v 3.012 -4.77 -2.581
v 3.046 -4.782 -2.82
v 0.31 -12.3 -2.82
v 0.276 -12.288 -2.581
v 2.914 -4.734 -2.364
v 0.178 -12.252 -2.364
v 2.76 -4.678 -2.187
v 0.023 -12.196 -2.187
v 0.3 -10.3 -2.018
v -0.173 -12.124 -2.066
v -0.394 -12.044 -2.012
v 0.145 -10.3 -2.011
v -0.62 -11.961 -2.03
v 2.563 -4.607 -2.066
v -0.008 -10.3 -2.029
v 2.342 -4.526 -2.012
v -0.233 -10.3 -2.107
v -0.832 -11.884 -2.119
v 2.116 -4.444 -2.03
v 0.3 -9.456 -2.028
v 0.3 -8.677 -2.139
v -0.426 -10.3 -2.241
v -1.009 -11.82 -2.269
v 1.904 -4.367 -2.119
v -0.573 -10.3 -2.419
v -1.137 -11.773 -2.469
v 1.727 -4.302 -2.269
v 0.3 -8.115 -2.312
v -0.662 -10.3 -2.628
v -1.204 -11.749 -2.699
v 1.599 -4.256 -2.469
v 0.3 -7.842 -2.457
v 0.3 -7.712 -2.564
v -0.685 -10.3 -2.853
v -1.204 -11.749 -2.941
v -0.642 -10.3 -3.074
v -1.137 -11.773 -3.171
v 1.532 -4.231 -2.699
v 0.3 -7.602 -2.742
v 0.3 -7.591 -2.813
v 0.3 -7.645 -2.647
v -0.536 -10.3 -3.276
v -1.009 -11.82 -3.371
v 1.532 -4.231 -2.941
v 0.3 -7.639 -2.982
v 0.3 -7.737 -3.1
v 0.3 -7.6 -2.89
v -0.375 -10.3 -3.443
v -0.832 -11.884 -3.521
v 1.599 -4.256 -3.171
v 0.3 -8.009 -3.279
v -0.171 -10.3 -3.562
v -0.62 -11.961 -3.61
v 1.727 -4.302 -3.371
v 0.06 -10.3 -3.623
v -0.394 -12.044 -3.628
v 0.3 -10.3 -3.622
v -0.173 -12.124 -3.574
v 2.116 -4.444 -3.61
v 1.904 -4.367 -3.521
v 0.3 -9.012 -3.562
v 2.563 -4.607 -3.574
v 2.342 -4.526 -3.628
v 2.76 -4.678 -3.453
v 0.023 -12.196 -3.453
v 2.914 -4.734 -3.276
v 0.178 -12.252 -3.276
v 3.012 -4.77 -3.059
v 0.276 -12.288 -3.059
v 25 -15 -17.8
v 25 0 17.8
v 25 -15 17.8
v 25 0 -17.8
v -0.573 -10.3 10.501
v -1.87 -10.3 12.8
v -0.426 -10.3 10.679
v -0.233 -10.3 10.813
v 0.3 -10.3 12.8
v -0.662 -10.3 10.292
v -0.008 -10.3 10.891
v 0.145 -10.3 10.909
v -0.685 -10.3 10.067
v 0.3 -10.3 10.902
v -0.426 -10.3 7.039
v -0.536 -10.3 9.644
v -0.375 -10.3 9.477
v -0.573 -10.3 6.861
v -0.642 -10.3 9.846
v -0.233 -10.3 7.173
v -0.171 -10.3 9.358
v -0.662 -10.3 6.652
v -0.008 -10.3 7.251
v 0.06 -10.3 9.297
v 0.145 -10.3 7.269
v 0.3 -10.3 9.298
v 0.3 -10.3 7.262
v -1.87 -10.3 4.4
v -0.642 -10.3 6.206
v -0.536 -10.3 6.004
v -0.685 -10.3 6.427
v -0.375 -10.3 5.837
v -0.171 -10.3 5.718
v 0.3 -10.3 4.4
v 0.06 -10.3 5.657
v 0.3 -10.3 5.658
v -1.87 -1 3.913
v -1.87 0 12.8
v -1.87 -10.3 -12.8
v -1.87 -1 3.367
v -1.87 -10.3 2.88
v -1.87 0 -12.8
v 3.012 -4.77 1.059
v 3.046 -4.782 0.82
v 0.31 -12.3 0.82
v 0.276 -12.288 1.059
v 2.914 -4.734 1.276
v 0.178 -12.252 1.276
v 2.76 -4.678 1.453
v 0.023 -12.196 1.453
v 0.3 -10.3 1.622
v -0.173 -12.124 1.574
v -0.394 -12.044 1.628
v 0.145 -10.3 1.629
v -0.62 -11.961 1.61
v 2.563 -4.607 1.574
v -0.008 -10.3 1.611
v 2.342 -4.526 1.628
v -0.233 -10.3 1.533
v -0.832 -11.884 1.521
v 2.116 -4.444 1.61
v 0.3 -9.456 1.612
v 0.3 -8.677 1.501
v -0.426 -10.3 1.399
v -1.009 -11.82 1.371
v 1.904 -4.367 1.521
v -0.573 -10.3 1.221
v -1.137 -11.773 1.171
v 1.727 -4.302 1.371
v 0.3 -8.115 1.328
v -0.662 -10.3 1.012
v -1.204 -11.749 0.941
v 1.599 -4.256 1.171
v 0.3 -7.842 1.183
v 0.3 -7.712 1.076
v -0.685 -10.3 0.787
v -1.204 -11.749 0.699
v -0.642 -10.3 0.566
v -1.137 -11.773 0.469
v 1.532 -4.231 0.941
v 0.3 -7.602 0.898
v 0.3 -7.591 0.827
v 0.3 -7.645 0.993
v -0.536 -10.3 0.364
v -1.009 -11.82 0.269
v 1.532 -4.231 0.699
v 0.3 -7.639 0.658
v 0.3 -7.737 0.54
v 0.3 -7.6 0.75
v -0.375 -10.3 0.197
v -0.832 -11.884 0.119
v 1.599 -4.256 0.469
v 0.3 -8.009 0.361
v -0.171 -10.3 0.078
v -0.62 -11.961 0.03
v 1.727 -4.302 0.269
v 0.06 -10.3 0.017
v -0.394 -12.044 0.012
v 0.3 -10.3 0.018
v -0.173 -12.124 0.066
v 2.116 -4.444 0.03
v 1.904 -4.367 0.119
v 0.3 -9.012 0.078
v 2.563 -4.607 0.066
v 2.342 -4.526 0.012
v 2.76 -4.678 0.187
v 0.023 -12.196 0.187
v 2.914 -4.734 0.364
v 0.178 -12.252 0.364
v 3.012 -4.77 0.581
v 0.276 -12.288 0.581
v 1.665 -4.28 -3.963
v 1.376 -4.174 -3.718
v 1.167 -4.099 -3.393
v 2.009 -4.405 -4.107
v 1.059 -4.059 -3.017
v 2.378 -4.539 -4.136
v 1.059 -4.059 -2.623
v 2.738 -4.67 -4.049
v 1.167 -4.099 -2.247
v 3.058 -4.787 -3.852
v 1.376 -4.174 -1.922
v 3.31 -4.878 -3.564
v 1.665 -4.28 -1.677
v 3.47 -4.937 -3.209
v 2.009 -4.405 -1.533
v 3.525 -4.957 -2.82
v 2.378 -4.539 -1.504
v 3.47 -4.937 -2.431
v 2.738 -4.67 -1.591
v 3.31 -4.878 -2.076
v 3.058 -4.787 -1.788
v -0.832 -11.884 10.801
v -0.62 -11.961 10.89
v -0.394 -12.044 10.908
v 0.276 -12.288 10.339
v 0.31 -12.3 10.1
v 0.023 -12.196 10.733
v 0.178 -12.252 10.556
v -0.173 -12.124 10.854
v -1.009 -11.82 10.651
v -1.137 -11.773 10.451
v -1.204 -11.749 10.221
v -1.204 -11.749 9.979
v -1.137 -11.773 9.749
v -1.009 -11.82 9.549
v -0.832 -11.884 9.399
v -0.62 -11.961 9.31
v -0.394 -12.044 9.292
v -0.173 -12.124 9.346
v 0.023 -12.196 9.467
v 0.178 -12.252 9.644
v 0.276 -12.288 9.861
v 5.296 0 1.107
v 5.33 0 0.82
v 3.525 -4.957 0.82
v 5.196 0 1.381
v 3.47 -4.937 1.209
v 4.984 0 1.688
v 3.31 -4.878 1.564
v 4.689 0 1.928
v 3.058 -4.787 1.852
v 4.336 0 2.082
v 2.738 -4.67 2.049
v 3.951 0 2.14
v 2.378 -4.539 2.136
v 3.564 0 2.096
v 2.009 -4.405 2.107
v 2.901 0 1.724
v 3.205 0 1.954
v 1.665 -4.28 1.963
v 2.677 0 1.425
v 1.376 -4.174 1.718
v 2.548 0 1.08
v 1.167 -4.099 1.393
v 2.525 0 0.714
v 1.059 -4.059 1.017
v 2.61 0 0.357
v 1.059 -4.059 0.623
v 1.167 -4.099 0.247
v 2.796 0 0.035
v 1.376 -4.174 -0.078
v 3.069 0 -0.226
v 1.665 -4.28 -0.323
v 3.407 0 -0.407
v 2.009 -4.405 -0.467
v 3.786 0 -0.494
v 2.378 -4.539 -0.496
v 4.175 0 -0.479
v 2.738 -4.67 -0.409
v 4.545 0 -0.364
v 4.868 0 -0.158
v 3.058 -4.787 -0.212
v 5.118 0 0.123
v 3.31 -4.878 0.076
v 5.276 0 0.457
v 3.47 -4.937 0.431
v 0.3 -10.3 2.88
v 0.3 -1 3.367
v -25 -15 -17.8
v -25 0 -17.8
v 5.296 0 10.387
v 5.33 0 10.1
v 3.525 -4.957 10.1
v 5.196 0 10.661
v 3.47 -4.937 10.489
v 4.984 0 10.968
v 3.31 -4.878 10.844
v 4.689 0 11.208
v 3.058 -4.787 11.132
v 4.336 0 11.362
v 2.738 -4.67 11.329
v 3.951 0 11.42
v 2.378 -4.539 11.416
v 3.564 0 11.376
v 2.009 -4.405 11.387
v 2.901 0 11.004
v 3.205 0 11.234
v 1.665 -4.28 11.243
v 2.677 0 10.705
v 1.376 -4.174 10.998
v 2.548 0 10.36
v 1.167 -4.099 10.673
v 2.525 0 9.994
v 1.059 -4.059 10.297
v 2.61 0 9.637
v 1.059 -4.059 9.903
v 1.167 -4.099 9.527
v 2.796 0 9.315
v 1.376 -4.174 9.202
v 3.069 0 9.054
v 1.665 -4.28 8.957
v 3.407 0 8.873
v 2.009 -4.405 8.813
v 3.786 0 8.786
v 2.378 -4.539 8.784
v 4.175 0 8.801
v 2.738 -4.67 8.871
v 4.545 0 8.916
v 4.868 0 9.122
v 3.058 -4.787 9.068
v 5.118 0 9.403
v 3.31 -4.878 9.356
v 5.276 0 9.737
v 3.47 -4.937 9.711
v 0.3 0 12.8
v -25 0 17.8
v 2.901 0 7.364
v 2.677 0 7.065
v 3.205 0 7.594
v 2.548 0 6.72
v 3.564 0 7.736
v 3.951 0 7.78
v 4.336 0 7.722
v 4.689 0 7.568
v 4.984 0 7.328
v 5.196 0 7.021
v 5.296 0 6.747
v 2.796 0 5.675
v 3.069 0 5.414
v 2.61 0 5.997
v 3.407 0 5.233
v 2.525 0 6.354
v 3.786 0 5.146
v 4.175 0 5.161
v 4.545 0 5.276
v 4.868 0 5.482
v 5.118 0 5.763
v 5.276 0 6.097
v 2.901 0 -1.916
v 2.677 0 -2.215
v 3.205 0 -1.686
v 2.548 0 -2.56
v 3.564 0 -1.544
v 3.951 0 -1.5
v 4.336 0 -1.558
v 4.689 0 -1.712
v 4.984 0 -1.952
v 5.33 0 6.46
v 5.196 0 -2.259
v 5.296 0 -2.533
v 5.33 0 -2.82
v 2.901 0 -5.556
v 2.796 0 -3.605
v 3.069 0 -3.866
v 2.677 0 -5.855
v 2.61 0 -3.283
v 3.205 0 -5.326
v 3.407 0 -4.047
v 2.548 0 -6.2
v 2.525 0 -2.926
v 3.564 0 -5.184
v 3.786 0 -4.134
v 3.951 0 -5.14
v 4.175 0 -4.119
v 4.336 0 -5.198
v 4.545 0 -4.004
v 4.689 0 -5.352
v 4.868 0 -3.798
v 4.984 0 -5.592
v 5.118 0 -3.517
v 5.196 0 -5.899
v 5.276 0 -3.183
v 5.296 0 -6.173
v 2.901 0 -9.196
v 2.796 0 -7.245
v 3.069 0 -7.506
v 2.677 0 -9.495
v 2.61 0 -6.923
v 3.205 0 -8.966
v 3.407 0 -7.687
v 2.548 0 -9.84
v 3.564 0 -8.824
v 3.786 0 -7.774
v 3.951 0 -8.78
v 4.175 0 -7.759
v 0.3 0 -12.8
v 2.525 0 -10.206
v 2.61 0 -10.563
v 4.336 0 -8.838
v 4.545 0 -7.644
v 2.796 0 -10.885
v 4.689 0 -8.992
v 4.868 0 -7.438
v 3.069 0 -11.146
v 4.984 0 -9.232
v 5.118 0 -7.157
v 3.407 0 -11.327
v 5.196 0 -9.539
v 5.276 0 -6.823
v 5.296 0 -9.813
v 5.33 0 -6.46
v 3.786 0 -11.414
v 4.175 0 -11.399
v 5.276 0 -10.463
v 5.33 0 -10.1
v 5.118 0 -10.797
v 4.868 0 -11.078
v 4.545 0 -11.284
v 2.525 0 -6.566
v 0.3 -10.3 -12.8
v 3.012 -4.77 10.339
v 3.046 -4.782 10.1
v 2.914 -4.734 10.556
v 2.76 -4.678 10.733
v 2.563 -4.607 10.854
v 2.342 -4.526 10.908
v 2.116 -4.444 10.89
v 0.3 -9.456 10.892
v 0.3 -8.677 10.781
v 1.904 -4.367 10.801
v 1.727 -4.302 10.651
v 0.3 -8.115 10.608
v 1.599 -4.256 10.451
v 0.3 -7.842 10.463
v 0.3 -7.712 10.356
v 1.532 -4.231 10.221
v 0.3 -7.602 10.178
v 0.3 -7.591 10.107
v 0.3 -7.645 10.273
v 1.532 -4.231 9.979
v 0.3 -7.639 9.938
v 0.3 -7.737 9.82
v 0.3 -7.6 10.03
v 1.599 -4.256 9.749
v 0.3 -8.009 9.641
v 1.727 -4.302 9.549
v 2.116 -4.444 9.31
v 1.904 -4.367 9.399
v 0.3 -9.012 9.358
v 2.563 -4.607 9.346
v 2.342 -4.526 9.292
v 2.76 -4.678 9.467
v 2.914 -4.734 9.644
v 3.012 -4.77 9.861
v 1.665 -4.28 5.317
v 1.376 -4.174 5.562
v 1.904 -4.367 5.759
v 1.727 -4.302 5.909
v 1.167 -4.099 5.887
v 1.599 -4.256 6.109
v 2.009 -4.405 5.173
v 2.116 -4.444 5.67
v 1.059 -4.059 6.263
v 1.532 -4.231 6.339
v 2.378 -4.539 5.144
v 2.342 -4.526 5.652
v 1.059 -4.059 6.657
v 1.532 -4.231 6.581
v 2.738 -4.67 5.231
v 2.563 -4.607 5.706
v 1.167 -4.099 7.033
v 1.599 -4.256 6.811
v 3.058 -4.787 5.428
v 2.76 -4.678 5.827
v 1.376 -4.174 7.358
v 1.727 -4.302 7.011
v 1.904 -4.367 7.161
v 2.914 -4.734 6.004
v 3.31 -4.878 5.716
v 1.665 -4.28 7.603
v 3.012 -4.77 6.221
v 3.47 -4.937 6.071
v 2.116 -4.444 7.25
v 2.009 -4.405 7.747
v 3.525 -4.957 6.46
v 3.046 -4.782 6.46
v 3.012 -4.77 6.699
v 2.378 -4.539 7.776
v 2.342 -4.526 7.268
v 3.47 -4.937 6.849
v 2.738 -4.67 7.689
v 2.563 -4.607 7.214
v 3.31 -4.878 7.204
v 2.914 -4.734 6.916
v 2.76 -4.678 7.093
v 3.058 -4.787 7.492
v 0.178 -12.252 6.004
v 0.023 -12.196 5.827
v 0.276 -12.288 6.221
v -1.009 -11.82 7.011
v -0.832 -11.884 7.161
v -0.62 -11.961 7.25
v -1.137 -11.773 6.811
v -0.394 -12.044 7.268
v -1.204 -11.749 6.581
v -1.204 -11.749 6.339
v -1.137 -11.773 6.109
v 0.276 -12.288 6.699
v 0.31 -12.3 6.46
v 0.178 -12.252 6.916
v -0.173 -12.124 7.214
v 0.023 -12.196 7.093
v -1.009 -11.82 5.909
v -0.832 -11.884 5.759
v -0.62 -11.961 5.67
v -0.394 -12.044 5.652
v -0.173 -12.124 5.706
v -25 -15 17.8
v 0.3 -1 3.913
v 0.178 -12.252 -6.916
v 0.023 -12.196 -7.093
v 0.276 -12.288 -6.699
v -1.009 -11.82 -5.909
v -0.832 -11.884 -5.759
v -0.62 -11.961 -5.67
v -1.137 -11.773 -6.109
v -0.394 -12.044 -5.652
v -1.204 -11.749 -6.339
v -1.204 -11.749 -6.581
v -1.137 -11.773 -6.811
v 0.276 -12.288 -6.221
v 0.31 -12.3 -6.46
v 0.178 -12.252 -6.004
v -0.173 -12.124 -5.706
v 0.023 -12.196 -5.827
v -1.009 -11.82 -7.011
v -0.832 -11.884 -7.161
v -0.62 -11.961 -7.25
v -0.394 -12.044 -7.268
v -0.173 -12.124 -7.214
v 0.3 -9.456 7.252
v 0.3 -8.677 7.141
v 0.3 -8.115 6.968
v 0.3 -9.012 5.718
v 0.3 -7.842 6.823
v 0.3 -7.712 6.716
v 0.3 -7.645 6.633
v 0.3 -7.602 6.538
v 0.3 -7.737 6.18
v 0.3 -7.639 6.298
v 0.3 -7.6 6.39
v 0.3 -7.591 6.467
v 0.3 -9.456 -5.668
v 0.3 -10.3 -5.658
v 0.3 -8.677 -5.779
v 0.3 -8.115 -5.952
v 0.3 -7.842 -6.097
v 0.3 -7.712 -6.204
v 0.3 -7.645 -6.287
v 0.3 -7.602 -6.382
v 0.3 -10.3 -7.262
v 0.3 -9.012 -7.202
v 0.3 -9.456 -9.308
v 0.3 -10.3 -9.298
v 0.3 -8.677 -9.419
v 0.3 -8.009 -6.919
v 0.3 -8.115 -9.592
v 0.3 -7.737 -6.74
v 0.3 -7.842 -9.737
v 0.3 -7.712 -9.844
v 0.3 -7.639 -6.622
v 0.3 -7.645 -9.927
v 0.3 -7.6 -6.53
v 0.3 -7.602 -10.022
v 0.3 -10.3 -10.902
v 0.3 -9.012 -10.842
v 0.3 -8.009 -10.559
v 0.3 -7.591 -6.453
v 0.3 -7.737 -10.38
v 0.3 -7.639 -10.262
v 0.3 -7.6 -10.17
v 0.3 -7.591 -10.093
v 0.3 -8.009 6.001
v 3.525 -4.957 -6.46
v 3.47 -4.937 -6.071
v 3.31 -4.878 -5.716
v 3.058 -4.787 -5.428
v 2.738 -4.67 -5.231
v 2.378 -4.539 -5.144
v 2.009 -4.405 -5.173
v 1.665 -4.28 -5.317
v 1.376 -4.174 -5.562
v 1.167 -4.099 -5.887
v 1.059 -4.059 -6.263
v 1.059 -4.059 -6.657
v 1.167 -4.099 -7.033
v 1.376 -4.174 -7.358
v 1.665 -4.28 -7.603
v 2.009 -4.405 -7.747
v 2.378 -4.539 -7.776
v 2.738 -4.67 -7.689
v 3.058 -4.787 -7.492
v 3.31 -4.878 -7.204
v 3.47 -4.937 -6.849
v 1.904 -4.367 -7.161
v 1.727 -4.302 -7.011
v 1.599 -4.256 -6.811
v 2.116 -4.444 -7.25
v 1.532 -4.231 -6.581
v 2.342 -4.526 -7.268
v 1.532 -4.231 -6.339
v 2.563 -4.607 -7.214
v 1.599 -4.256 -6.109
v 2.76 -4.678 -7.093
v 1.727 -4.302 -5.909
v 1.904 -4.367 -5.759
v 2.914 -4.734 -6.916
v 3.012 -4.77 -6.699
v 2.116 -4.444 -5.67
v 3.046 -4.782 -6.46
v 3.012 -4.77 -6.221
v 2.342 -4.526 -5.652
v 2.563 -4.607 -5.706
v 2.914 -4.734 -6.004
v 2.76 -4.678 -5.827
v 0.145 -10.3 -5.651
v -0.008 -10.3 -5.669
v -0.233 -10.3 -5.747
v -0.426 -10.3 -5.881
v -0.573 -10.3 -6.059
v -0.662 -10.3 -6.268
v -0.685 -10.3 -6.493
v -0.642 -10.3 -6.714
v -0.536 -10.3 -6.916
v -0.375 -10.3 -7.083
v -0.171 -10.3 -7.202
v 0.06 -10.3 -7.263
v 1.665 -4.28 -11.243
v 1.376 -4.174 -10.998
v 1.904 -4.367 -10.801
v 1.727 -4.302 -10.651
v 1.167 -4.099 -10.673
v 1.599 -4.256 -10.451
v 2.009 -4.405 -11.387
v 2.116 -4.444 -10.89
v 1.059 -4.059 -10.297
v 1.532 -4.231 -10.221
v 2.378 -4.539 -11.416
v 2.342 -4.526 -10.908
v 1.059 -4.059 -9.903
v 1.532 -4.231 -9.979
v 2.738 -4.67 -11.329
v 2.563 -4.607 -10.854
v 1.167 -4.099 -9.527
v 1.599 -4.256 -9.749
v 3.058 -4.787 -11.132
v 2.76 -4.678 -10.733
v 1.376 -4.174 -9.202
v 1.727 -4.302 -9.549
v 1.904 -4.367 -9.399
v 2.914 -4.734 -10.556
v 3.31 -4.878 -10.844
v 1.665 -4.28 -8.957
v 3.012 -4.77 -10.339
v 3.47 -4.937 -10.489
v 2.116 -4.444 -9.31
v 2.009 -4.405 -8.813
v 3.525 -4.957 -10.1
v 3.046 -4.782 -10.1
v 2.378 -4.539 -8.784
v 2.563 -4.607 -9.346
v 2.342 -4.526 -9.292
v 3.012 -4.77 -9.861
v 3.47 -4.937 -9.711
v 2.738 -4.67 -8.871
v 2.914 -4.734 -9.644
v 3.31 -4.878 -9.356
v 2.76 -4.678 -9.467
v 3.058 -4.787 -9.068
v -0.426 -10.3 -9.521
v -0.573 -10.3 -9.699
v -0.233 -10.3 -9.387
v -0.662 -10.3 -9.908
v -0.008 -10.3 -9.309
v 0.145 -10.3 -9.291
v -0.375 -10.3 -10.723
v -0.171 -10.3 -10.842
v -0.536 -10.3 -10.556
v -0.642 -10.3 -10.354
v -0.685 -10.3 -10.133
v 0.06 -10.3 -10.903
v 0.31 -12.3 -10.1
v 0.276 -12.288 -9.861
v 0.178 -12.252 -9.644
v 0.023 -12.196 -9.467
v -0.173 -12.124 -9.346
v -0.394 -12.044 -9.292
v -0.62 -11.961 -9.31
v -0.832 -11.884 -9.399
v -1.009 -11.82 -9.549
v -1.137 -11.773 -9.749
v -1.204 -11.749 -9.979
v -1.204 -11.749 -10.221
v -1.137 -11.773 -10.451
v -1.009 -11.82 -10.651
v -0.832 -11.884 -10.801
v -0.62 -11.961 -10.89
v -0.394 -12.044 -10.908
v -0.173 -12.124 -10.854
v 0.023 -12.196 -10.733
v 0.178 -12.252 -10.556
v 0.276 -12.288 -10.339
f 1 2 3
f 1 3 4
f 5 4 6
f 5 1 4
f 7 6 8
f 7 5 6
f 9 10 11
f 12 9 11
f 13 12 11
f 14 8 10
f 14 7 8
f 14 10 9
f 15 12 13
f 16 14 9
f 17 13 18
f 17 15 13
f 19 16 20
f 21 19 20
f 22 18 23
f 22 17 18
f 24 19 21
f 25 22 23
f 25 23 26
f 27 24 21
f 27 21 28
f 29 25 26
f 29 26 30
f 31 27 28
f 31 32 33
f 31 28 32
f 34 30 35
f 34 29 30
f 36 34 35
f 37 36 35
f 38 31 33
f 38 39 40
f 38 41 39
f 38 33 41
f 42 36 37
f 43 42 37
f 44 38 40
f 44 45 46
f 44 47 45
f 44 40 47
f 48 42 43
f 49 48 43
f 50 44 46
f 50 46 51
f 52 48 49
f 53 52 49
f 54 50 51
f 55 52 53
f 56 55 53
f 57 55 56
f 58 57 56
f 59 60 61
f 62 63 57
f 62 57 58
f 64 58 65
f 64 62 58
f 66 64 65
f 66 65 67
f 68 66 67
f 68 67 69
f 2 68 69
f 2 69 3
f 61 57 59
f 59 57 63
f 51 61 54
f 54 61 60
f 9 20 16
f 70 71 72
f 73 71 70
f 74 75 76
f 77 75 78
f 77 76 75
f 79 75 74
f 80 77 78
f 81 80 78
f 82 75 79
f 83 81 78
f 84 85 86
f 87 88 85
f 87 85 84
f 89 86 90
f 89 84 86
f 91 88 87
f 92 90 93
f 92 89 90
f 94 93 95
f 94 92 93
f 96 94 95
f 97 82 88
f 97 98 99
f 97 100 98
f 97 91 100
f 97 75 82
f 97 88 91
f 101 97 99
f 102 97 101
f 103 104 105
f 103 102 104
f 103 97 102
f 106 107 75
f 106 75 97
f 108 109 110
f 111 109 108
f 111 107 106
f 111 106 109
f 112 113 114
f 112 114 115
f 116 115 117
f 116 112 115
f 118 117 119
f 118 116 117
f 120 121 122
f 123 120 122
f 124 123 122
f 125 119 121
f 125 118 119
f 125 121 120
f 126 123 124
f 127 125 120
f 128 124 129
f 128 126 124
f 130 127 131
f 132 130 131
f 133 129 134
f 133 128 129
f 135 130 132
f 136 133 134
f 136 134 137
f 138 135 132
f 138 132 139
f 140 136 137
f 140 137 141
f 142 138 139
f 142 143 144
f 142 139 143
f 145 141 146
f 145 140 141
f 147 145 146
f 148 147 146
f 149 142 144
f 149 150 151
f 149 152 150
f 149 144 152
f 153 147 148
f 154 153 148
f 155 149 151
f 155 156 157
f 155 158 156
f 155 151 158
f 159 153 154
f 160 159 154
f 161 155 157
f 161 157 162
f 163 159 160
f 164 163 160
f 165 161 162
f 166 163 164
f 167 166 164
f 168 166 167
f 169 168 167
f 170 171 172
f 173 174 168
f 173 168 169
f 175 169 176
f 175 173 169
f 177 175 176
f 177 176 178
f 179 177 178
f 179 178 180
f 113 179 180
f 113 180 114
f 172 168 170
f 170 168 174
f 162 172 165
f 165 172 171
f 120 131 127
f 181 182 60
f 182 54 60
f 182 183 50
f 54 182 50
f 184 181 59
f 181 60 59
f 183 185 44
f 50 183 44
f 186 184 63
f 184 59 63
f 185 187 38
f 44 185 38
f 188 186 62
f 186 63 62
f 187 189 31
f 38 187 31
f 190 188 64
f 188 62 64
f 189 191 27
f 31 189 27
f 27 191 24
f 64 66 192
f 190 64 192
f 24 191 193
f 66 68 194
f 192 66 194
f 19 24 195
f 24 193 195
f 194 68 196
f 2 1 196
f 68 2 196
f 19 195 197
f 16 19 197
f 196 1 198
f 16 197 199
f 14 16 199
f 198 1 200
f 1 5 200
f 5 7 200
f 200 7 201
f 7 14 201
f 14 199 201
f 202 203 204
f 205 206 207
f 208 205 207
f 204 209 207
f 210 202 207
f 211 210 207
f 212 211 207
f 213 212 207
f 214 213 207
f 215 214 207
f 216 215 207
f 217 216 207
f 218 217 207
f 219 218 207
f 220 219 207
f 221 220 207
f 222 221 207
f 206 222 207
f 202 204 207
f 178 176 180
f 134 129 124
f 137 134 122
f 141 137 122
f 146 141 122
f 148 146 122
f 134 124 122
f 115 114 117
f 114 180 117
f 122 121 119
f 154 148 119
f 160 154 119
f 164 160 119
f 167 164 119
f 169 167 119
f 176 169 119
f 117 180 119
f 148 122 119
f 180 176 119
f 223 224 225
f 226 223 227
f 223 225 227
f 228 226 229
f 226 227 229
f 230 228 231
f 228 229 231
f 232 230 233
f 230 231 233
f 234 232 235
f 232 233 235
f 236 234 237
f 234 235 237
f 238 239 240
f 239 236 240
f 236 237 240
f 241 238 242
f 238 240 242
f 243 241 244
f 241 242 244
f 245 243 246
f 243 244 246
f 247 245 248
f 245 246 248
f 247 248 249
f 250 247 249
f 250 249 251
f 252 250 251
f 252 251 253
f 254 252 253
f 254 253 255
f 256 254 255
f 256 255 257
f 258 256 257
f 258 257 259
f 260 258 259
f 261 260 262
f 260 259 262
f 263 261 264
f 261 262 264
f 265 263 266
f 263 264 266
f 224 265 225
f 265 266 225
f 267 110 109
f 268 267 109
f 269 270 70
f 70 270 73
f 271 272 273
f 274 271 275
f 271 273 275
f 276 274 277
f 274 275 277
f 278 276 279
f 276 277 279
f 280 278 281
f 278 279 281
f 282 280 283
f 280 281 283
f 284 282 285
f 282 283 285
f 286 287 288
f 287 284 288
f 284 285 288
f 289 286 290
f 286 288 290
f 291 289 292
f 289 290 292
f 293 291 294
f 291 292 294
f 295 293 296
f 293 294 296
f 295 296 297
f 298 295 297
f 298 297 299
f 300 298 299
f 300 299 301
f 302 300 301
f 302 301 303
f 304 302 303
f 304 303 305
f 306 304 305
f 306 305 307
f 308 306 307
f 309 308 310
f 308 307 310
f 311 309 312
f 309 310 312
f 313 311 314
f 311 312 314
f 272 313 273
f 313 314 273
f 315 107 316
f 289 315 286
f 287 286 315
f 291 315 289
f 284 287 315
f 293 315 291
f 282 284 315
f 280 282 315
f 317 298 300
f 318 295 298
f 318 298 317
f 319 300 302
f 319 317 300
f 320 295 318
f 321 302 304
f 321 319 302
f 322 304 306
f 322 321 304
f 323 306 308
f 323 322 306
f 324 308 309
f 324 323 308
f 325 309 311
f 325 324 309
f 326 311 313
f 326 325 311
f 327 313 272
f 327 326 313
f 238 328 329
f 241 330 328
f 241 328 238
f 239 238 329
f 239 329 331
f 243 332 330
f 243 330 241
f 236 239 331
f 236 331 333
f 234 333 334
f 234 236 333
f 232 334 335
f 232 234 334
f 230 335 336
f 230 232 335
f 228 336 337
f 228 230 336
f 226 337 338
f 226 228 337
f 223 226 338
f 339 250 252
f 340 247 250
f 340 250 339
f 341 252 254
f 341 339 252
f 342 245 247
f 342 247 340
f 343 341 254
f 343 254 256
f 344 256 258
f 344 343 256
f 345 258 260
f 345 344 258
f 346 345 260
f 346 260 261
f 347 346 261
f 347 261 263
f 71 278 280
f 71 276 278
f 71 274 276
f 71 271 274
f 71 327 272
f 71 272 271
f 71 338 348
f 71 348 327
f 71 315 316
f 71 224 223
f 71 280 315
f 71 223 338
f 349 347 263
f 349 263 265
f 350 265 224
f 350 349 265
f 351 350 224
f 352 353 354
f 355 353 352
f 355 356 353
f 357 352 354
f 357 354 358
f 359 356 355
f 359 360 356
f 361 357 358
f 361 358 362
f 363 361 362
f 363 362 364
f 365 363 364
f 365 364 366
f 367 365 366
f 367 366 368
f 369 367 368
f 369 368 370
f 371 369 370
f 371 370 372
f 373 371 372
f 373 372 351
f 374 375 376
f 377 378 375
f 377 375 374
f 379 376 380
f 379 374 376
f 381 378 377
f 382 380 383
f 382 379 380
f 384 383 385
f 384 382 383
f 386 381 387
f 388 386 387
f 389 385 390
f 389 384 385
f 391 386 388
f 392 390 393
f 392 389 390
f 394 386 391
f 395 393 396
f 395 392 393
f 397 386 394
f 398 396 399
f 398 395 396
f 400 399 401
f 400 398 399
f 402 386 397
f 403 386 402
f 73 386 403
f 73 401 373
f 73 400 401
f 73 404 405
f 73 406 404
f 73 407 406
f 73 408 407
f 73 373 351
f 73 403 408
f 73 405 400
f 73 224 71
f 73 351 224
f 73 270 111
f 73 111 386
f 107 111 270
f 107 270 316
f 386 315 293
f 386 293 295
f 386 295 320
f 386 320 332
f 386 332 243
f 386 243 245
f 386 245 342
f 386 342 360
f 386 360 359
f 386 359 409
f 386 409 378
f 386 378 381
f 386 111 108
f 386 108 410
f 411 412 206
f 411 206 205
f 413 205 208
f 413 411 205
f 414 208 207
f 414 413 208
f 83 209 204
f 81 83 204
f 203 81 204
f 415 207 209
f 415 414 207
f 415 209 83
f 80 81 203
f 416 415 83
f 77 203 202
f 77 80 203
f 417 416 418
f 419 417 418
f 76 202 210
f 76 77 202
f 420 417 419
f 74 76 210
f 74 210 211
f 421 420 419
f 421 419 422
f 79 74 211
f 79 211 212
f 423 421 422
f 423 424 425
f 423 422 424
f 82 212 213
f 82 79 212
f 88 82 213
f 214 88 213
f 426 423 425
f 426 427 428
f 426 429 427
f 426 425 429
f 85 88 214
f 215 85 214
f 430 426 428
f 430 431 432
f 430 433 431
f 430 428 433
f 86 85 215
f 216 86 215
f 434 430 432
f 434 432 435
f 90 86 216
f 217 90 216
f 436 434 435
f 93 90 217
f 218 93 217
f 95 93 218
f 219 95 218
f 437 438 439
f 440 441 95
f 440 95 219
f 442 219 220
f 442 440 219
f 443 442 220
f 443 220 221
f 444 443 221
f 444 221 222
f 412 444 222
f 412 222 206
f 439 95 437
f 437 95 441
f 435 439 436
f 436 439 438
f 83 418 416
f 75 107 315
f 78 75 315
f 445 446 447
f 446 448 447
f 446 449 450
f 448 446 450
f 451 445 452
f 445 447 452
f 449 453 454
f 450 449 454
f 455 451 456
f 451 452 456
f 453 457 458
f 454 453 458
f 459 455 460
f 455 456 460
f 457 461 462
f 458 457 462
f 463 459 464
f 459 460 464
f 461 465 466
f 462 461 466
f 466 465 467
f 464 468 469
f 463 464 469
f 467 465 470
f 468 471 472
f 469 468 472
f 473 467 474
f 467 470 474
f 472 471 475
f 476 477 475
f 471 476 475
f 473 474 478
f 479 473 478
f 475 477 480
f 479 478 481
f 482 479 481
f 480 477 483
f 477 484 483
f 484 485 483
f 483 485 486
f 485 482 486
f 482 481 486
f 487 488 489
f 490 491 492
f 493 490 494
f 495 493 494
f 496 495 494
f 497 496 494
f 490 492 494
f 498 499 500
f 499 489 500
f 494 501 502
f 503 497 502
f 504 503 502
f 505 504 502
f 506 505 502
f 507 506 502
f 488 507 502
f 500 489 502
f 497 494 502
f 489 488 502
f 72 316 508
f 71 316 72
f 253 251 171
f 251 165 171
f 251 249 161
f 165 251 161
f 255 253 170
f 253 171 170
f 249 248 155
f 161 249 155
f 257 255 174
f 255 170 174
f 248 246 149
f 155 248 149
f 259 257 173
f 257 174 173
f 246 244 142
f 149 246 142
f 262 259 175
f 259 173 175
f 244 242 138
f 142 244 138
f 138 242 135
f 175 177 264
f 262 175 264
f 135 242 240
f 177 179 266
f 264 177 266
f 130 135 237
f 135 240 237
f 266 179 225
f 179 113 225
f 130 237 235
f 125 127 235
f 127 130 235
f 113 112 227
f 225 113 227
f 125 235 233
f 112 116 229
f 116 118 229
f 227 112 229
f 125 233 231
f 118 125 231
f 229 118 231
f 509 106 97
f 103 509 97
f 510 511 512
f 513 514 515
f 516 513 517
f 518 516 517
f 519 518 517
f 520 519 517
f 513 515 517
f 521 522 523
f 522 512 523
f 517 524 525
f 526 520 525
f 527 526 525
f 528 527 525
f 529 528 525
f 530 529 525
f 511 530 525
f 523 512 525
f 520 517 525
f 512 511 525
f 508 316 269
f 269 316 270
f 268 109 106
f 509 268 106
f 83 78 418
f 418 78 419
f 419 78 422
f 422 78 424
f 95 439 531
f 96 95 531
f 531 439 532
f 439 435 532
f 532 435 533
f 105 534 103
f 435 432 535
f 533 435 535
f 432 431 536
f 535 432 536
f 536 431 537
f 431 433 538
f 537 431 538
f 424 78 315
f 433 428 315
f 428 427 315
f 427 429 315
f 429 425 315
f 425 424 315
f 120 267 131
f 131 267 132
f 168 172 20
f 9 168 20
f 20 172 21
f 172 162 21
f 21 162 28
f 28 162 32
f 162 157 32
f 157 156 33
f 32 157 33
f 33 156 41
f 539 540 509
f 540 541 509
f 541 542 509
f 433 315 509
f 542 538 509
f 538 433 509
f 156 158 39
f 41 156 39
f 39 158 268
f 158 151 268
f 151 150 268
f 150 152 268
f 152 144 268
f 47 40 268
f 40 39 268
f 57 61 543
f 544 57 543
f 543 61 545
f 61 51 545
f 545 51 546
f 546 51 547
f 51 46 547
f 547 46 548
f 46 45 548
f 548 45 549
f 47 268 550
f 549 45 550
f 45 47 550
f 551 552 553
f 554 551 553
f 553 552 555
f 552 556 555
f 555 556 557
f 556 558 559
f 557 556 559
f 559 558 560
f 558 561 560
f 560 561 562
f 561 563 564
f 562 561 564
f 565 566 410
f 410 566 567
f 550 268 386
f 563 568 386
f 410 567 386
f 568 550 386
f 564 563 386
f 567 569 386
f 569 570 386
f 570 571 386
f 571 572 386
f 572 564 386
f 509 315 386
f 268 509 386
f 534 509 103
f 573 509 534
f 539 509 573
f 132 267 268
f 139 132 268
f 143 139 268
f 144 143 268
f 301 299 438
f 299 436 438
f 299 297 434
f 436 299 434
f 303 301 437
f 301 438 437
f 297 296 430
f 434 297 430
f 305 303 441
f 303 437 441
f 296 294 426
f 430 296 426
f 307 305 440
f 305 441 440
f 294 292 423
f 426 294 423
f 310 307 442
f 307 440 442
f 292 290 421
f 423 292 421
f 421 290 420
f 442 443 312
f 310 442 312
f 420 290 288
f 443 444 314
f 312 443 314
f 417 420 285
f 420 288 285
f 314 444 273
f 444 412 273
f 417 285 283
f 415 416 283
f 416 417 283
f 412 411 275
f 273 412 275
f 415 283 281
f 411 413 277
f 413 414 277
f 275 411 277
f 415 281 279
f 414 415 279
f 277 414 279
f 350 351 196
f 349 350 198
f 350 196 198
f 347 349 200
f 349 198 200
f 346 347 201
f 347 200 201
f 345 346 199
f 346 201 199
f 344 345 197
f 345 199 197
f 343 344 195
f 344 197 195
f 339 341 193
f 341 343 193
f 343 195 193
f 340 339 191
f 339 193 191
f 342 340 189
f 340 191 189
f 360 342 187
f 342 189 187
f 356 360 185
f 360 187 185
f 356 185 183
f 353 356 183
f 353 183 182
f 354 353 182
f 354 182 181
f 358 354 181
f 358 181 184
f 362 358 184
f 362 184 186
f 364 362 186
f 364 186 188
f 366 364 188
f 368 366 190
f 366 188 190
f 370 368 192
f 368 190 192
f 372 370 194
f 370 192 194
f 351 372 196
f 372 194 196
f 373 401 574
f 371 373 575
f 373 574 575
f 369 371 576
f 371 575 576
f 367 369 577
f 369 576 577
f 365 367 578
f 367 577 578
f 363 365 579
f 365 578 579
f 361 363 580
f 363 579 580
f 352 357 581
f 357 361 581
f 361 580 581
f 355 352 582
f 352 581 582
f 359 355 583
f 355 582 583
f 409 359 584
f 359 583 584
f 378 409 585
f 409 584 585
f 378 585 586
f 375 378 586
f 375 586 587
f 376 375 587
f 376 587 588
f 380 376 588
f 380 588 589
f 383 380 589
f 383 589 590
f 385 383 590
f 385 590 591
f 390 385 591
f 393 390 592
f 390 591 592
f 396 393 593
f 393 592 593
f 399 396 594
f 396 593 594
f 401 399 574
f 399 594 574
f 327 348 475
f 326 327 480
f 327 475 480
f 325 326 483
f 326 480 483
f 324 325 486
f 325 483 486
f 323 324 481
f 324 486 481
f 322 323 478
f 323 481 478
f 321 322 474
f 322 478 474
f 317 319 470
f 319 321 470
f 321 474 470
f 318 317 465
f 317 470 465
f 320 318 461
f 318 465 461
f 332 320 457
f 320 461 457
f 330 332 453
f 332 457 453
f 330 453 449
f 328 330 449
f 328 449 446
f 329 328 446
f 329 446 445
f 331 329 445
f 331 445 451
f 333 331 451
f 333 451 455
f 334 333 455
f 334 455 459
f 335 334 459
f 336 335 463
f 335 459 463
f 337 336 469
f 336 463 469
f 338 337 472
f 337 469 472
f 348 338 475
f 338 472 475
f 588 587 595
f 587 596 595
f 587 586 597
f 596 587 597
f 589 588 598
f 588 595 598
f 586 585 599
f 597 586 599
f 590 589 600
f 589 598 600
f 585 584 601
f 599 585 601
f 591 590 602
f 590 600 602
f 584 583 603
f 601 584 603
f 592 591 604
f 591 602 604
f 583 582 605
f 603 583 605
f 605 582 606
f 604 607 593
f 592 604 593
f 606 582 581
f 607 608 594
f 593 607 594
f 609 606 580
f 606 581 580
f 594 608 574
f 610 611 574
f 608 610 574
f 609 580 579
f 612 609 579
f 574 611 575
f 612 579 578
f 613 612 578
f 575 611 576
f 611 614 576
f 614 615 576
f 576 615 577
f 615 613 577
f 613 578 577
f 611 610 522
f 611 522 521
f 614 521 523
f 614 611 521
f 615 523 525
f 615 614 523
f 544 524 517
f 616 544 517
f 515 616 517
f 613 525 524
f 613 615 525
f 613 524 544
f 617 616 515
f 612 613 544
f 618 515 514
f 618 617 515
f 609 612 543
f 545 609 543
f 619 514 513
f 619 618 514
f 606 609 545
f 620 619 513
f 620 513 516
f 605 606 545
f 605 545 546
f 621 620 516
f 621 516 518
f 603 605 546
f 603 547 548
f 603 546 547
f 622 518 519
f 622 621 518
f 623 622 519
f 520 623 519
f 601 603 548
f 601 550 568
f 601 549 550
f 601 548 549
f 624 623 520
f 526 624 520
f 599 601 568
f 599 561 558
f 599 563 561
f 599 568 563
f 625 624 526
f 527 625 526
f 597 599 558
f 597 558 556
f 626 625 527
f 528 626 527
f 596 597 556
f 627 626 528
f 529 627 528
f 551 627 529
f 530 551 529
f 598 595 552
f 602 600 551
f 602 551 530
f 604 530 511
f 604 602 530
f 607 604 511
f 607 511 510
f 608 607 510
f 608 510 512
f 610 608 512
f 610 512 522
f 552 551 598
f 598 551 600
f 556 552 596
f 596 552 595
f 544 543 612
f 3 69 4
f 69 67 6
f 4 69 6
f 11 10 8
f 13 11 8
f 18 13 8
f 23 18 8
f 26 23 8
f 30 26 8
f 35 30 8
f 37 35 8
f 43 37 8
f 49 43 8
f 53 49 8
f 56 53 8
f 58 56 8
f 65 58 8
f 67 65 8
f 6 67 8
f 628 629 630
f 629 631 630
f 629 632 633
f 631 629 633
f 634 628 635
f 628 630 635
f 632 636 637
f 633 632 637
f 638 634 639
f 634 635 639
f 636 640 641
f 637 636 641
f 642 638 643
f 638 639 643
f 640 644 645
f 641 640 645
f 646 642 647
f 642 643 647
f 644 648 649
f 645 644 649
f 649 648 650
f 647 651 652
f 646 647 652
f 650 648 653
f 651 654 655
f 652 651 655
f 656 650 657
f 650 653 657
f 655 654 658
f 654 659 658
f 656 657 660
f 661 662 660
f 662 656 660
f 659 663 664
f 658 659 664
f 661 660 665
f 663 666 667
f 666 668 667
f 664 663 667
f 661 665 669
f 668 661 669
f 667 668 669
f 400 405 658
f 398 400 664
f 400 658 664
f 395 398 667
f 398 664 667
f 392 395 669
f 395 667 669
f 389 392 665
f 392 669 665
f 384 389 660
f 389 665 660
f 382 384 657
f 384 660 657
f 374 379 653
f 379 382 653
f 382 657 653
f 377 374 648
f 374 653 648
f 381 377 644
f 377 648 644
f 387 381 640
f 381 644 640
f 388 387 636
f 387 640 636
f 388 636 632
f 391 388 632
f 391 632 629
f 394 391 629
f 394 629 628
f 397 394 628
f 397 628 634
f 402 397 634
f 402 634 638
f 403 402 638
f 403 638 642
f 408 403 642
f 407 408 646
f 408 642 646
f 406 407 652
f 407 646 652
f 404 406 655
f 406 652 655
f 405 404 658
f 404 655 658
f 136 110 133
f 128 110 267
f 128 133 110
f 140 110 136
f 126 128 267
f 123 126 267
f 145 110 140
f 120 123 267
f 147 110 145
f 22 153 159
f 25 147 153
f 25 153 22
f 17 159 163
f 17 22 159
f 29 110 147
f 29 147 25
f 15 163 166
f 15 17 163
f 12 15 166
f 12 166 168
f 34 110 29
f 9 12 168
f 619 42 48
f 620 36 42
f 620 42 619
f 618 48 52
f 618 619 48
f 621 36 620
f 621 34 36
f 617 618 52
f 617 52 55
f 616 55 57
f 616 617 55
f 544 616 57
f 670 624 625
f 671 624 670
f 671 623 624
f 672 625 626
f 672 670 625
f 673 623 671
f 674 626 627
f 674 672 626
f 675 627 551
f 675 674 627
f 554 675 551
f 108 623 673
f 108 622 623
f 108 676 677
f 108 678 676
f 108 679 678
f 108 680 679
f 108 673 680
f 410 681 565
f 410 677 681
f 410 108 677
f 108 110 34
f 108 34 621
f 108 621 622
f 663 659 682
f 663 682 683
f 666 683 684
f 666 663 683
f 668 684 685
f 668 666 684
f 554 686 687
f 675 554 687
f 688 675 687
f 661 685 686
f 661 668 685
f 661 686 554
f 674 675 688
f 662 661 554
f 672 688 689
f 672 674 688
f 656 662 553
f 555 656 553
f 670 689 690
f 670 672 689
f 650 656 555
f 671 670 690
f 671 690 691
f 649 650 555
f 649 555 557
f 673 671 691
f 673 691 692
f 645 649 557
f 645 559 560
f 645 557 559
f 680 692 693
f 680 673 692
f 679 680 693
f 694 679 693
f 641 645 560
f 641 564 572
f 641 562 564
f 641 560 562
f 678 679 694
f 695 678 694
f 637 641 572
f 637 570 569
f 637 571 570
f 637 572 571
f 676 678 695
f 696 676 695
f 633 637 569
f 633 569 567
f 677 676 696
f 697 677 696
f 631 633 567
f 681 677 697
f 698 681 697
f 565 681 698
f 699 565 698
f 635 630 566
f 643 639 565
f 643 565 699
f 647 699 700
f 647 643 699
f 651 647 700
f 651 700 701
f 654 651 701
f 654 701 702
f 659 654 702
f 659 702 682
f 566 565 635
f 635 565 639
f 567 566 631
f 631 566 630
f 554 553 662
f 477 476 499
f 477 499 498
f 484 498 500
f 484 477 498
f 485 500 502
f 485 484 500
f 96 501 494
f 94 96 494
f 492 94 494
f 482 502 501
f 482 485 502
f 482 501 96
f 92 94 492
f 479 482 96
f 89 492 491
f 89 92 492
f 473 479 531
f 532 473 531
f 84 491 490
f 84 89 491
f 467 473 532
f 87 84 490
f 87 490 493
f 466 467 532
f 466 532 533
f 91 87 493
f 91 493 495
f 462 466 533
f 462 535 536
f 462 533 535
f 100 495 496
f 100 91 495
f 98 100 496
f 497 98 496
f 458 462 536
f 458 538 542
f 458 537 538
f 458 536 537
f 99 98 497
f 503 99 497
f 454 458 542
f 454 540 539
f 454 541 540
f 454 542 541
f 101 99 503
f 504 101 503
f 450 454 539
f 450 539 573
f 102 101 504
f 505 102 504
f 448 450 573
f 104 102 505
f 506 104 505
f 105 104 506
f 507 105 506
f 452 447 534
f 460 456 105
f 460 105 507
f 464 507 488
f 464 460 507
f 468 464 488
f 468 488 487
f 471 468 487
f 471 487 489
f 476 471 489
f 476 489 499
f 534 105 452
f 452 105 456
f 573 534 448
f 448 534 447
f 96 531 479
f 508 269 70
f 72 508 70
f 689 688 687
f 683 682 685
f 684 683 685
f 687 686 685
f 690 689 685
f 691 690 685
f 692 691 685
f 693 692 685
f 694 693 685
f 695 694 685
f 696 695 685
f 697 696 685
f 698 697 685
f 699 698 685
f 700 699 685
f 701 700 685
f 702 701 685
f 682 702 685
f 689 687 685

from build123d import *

# Parameters (mm, degrees)
SKETCH1_W                = 50
SKETCH1_H                = 35.6
BOSS_EXTRUDE2_DEPTH      = 15
SKETCH9_W                = 2.17
SKETCH9_H                = 25.6
CUT_EXTRUDE1_DEPTH       = 10.3
SKETCH7_R                = 1.32
CUT_EXTRUDE2_DEPTH       = 34.770899441
SKETCH10_R               = 0.81
CUT_EXTRUDE3_DEPTH       = 8
BOSS_EXTRUDE3_DEPTH      = 0.3
BOSS_EXTRUDE3_DEPTH_BACK = 1.87


with BuildPart() as part:
    # Sketch1 → Boss-Extrude2 (new body)
    with BuildSketch(Plane(origin=(0, 0, 0), x_dir=(1, 0, 0), z_dir=(0, 1, 0))):
        Rectangle(SKETCH1_W, SKETCH1_H)
    extrude(amount=-BOSS_EXTRUDE2_DEPTH)

    # Sketch9 → Cut-Extrude1 (cut)
    with BuildSketch(Plane(origin=(0, 0, 0), x_dir=(1, 0, 0), z_dir=(0, 1, 0))):
        with Locations((-0.785, 0)):
            Rectangle(SKETCH9_W, SKETCH9_H)
    extrude(amount=-CUT_EXTRUDE1_DEPTH, mode=Mode.SUBTRACT)

    # Sketch7 → Cut-Extrude2 (cut, through all)
    with BuildSketch(Plane(origin=(-1.180715955, -3.243990424, 0), x_dir=(-0.9396926207859082, 0.3420201433256691, 0), z_dir=(-0.3420201433256691, -0.9396926207859082, 0))):
        with Locations(Location((-3.68818129, 10.1, 0), (0, 0, 180))):
            Circle(SKETCH7_R)
        with Locations(Location((-3.68818129, 6.46, 0), (0, 0, 180))):
            Circle(SKETCH7_R)
        with Locations(Location((-3.68818129, 2.82, 0), (0, 0, 180))):
            Circle(SKETCH7_R)
        with Locations(Location((-3.68818129, -0.82, 0), (0, 0, 180))):
            Circle(SKETCH7_R)
        with Locations(Location((-3.68818129, -6.46, 0), (0, 0, 180))):
            Circle(SKETCH7_R)
        with Locations(Location((-3.68818129, -10.1, 0), (0, 0, 180))):
            Circle(SKETCH7_R)
    extrude(amount=-CUT_EXTRUDE2_DEPTH, mode=Mode.SUBTRACT)

    # Sketch10 → Cut-Extrude3 (cut)
    with BuildSketch(Plane(origin=(-1.180715955, -3.243990424, 0), x_dir=(-0.9396926207859082, 0.3420201433256691, 0), z_dir=(-0.3420201433256691, -0.9396926207859082, 0))):
        with Locations(Location((-3.68818129, -10.1, 0), (0, 0, 180))):
            Circle(SKETCH10_R)
        with Locations(Location((-3.68818129, -6.46, 0), (0, 0, 180))):
            Circle(SKETCH10_R)
        with Locations(Location((-3.68818129, -0.82, 0), (0, 0, 180))):
            Circle(SKETCH10_R)
        with Locations(Location((-3.68818129, 2.82, 0), (0, 0, 180))):
            Circle(SKETCH10_R)
        with Locations(Location((-3.68818129, 6.46, 0), (0, 0, 180))):
            Circle(SKETCH10_R)
        with Locations(Location((-3.68818129, 10.1, 0), (0, 0, 180))):
            Circle(SKETCH10_R)
    extrude(amount=CUT_EXTRUDE3_DEPTH, mode=Mode.SUBTRACT)

    # Sketch11 → Boss-Extrude3 (add, two sides: drawn at the far end of the back side and taken through both)
    with BuildSketch(Plane(origin=(0, 0, 0), x_dir=(0, 0, -1), z_dir=(1, 0, 0)).offset(-BOSS_EXTRUDE3_DEPTH_BACK)):
        Polygon((-4.40036814, -10.3), (-2.87963186, -10.3), (-3.367024207, -1), (-3.912975793, -1), align=None)
    extrude(amount=BOSS_EXTRUDE3_DEPTH + BOSS_EXTRUDE3_DEPTH_BACK)


solid = part.part
